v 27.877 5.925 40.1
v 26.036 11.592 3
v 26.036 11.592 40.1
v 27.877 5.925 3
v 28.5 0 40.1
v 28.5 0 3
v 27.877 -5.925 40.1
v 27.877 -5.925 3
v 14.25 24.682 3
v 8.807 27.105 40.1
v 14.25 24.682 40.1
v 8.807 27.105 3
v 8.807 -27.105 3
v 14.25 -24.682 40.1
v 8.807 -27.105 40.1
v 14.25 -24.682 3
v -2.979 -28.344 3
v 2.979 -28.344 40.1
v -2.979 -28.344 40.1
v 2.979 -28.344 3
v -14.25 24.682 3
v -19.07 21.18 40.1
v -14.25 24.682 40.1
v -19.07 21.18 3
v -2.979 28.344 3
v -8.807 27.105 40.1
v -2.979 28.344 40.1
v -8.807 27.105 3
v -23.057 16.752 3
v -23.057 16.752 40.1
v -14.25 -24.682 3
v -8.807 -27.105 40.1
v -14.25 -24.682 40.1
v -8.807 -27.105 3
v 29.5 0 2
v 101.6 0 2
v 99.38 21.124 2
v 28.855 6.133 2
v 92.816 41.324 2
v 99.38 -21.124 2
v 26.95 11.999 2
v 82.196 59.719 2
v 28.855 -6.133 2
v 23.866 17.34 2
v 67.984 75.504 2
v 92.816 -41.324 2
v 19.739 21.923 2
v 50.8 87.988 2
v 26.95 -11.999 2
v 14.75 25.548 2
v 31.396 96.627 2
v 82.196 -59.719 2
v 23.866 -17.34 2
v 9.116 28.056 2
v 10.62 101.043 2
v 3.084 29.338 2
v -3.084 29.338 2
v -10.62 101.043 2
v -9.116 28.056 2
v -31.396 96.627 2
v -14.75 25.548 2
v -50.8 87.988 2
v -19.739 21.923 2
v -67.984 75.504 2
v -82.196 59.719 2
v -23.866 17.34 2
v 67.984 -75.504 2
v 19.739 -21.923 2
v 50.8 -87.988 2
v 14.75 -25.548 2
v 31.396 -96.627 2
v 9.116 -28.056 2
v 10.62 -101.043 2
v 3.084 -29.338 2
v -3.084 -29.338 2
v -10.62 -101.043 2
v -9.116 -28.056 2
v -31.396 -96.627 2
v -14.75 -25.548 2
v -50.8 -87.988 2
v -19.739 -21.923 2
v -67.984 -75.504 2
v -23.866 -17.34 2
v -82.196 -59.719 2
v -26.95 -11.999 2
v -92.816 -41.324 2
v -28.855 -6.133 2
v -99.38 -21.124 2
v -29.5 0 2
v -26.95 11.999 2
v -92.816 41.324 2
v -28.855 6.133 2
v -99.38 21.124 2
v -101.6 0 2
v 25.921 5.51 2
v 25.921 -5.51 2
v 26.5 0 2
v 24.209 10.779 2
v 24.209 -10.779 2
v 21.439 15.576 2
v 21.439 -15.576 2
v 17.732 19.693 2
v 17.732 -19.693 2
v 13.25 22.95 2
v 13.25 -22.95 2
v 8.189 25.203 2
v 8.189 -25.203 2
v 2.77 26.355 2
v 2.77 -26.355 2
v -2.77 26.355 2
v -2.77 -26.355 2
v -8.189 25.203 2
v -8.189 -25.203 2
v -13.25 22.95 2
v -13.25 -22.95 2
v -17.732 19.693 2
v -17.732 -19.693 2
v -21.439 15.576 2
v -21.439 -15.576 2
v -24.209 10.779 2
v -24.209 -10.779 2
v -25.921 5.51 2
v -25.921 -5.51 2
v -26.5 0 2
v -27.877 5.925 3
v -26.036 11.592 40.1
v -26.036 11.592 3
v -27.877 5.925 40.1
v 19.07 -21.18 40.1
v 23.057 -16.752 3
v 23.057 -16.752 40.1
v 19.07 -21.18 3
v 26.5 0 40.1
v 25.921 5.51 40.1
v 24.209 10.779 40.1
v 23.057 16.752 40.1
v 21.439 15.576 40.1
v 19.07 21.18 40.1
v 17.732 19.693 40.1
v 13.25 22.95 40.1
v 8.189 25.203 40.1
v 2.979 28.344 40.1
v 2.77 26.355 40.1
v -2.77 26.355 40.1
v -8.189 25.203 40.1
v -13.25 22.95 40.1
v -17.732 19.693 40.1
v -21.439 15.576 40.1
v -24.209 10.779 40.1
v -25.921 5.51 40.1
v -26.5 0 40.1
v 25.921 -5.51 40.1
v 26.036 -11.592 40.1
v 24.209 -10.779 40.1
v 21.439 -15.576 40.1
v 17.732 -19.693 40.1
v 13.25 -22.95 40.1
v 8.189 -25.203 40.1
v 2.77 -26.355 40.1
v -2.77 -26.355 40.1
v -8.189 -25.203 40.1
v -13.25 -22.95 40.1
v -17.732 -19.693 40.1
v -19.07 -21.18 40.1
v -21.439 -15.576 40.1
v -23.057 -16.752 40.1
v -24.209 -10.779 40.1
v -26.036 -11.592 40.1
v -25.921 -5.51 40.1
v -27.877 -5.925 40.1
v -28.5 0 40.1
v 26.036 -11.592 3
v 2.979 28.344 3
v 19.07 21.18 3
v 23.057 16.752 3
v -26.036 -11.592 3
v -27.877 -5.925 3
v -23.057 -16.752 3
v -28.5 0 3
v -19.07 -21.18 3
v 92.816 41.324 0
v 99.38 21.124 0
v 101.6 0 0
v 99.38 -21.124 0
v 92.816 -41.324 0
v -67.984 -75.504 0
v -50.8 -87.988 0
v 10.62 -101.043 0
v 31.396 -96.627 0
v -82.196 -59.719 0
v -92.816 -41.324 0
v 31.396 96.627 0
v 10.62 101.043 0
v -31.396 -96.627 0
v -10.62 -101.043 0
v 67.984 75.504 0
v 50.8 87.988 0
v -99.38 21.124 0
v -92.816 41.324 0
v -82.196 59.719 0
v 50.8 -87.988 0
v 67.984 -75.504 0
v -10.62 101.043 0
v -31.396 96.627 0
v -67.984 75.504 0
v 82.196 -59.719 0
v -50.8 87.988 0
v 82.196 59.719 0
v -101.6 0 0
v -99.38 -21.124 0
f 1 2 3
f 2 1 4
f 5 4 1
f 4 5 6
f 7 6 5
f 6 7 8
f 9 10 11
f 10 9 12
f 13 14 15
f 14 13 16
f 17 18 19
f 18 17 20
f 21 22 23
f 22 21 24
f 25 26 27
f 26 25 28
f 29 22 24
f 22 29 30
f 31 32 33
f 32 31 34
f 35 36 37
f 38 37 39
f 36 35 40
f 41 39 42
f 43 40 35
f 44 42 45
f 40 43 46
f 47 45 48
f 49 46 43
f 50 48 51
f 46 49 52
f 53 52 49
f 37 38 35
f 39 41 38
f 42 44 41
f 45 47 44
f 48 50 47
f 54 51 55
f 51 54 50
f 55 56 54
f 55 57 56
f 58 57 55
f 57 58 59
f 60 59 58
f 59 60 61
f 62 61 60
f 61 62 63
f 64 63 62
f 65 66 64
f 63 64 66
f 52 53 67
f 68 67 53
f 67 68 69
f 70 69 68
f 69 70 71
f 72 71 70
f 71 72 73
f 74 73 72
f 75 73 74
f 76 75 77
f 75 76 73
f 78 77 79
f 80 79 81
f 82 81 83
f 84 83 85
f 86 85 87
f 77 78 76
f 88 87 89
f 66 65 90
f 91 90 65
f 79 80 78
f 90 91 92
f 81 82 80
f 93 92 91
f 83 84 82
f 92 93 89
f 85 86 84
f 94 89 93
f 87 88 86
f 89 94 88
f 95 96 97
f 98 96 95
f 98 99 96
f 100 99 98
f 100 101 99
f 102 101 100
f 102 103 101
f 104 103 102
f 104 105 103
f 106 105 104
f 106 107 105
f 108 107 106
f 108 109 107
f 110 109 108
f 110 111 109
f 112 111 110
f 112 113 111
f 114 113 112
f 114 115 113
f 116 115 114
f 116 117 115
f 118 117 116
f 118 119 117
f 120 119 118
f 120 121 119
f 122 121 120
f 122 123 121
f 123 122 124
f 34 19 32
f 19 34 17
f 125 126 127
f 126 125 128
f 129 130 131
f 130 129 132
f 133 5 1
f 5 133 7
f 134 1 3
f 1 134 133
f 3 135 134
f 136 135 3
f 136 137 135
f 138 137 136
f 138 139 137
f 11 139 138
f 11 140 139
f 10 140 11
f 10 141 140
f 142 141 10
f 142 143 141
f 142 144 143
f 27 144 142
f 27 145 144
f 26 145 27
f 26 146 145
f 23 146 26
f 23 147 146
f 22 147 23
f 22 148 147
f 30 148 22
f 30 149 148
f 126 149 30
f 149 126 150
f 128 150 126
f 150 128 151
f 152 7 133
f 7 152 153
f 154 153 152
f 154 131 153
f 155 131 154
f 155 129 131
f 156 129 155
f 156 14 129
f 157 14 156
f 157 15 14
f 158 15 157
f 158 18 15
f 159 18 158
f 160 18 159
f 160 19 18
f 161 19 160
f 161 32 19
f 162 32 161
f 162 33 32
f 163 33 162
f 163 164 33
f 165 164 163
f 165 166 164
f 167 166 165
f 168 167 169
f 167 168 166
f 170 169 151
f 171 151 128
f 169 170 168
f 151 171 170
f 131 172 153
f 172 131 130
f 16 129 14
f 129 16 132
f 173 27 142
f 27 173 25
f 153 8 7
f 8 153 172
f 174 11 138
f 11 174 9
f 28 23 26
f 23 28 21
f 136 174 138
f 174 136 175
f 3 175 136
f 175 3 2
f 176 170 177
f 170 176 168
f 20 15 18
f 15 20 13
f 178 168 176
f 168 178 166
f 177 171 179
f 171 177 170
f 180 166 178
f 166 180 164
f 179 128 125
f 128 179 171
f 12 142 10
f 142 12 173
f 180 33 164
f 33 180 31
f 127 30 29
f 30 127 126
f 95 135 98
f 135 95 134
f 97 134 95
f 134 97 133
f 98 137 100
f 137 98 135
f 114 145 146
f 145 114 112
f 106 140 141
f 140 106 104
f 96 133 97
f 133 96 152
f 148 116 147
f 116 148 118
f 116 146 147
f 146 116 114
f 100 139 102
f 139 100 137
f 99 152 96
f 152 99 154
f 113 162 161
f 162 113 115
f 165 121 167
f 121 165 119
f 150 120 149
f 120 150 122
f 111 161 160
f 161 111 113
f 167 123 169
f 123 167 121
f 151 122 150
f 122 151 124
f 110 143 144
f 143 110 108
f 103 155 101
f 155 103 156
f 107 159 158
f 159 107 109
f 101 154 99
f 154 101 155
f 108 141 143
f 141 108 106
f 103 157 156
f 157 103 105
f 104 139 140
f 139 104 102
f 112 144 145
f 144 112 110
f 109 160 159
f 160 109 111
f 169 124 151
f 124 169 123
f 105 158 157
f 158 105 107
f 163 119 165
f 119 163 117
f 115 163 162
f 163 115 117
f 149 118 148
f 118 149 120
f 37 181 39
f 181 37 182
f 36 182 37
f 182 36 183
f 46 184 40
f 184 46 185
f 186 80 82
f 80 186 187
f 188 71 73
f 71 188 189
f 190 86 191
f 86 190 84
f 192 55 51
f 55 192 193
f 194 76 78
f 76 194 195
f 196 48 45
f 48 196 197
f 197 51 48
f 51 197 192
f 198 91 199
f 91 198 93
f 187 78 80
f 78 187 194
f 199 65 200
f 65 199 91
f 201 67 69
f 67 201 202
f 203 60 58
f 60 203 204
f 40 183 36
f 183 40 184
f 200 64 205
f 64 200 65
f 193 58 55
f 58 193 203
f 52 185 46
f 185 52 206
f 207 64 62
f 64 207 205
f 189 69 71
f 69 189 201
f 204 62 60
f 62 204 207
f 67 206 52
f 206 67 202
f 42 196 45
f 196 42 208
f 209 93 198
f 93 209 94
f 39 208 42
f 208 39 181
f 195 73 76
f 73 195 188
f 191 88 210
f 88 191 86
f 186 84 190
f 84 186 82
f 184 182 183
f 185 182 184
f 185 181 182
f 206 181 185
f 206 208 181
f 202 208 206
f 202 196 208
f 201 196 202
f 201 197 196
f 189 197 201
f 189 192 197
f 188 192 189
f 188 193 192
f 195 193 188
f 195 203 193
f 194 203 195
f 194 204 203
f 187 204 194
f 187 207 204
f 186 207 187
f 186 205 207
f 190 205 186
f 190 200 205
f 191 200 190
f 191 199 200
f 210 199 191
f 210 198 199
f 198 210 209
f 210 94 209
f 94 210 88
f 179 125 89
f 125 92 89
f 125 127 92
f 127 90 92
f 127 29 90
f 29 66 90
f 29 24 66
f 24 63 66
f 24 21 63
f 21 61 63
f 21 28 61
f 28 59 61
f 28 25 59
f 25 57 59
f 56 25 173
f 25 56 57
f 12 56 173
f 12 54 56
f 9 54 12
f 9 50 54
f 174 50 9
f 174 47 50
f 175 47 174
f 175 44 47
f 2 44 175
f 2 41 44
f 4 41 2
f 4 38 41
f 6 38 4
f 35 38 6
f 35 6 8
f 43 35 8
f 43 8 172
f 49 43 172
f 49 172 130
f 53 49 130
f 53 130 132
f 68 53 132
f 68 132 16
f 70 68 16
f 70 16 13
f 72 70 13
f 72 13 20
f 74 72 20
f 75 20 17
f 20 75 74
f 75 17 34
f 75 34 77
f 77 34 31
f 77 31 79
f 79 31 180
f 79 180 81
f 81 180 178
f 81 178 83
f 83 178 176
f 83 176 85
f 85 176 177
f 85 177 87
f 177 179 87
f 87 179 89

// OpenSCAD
// Parameters
disk_radius_mm = 4 * 25.4;  // Convert 4 inches to mm
disk_thickness_mm = 2;

annulus_inner_radius_mm = 26.5;
annulus_outer_radius_mm = 28.5;
annulus_height_mm = 1.5 * 25.4;  // Convert 1.5 inches to mm

triangle_side_mm = 1;  // Side length of the right triangle

// Flat circular disk
cylinder(h = disk_thickness_mm, r = disk_radius_mm, center = false);

// Annular extrusion
translate([0, 0, disk_thickness_mm]) {
    difference() {
        // Main annular extrusion
        cylinder(h = annulus_height_mm, r = annulus_outer_radius_mm, center = false);

        // Inner cutout to form the annulus
        cylinder(h = annulus_height_mm, r = annulus_inner_radius_mm, center = false);
    }
}

// Right triangle reinforcement at the base
translate([0, 0, disk_thickness_mm]) {
    rotate_extrude(angle = 360) {
        polygon(points = [
            [annulus_outer_radius_mm, 0],
            [annulus_outer_radius_mm + triangle_side_mm, 0],
            [annulus_outer_radius_mm, triangle_side_mm]
        ]);
    }
}
